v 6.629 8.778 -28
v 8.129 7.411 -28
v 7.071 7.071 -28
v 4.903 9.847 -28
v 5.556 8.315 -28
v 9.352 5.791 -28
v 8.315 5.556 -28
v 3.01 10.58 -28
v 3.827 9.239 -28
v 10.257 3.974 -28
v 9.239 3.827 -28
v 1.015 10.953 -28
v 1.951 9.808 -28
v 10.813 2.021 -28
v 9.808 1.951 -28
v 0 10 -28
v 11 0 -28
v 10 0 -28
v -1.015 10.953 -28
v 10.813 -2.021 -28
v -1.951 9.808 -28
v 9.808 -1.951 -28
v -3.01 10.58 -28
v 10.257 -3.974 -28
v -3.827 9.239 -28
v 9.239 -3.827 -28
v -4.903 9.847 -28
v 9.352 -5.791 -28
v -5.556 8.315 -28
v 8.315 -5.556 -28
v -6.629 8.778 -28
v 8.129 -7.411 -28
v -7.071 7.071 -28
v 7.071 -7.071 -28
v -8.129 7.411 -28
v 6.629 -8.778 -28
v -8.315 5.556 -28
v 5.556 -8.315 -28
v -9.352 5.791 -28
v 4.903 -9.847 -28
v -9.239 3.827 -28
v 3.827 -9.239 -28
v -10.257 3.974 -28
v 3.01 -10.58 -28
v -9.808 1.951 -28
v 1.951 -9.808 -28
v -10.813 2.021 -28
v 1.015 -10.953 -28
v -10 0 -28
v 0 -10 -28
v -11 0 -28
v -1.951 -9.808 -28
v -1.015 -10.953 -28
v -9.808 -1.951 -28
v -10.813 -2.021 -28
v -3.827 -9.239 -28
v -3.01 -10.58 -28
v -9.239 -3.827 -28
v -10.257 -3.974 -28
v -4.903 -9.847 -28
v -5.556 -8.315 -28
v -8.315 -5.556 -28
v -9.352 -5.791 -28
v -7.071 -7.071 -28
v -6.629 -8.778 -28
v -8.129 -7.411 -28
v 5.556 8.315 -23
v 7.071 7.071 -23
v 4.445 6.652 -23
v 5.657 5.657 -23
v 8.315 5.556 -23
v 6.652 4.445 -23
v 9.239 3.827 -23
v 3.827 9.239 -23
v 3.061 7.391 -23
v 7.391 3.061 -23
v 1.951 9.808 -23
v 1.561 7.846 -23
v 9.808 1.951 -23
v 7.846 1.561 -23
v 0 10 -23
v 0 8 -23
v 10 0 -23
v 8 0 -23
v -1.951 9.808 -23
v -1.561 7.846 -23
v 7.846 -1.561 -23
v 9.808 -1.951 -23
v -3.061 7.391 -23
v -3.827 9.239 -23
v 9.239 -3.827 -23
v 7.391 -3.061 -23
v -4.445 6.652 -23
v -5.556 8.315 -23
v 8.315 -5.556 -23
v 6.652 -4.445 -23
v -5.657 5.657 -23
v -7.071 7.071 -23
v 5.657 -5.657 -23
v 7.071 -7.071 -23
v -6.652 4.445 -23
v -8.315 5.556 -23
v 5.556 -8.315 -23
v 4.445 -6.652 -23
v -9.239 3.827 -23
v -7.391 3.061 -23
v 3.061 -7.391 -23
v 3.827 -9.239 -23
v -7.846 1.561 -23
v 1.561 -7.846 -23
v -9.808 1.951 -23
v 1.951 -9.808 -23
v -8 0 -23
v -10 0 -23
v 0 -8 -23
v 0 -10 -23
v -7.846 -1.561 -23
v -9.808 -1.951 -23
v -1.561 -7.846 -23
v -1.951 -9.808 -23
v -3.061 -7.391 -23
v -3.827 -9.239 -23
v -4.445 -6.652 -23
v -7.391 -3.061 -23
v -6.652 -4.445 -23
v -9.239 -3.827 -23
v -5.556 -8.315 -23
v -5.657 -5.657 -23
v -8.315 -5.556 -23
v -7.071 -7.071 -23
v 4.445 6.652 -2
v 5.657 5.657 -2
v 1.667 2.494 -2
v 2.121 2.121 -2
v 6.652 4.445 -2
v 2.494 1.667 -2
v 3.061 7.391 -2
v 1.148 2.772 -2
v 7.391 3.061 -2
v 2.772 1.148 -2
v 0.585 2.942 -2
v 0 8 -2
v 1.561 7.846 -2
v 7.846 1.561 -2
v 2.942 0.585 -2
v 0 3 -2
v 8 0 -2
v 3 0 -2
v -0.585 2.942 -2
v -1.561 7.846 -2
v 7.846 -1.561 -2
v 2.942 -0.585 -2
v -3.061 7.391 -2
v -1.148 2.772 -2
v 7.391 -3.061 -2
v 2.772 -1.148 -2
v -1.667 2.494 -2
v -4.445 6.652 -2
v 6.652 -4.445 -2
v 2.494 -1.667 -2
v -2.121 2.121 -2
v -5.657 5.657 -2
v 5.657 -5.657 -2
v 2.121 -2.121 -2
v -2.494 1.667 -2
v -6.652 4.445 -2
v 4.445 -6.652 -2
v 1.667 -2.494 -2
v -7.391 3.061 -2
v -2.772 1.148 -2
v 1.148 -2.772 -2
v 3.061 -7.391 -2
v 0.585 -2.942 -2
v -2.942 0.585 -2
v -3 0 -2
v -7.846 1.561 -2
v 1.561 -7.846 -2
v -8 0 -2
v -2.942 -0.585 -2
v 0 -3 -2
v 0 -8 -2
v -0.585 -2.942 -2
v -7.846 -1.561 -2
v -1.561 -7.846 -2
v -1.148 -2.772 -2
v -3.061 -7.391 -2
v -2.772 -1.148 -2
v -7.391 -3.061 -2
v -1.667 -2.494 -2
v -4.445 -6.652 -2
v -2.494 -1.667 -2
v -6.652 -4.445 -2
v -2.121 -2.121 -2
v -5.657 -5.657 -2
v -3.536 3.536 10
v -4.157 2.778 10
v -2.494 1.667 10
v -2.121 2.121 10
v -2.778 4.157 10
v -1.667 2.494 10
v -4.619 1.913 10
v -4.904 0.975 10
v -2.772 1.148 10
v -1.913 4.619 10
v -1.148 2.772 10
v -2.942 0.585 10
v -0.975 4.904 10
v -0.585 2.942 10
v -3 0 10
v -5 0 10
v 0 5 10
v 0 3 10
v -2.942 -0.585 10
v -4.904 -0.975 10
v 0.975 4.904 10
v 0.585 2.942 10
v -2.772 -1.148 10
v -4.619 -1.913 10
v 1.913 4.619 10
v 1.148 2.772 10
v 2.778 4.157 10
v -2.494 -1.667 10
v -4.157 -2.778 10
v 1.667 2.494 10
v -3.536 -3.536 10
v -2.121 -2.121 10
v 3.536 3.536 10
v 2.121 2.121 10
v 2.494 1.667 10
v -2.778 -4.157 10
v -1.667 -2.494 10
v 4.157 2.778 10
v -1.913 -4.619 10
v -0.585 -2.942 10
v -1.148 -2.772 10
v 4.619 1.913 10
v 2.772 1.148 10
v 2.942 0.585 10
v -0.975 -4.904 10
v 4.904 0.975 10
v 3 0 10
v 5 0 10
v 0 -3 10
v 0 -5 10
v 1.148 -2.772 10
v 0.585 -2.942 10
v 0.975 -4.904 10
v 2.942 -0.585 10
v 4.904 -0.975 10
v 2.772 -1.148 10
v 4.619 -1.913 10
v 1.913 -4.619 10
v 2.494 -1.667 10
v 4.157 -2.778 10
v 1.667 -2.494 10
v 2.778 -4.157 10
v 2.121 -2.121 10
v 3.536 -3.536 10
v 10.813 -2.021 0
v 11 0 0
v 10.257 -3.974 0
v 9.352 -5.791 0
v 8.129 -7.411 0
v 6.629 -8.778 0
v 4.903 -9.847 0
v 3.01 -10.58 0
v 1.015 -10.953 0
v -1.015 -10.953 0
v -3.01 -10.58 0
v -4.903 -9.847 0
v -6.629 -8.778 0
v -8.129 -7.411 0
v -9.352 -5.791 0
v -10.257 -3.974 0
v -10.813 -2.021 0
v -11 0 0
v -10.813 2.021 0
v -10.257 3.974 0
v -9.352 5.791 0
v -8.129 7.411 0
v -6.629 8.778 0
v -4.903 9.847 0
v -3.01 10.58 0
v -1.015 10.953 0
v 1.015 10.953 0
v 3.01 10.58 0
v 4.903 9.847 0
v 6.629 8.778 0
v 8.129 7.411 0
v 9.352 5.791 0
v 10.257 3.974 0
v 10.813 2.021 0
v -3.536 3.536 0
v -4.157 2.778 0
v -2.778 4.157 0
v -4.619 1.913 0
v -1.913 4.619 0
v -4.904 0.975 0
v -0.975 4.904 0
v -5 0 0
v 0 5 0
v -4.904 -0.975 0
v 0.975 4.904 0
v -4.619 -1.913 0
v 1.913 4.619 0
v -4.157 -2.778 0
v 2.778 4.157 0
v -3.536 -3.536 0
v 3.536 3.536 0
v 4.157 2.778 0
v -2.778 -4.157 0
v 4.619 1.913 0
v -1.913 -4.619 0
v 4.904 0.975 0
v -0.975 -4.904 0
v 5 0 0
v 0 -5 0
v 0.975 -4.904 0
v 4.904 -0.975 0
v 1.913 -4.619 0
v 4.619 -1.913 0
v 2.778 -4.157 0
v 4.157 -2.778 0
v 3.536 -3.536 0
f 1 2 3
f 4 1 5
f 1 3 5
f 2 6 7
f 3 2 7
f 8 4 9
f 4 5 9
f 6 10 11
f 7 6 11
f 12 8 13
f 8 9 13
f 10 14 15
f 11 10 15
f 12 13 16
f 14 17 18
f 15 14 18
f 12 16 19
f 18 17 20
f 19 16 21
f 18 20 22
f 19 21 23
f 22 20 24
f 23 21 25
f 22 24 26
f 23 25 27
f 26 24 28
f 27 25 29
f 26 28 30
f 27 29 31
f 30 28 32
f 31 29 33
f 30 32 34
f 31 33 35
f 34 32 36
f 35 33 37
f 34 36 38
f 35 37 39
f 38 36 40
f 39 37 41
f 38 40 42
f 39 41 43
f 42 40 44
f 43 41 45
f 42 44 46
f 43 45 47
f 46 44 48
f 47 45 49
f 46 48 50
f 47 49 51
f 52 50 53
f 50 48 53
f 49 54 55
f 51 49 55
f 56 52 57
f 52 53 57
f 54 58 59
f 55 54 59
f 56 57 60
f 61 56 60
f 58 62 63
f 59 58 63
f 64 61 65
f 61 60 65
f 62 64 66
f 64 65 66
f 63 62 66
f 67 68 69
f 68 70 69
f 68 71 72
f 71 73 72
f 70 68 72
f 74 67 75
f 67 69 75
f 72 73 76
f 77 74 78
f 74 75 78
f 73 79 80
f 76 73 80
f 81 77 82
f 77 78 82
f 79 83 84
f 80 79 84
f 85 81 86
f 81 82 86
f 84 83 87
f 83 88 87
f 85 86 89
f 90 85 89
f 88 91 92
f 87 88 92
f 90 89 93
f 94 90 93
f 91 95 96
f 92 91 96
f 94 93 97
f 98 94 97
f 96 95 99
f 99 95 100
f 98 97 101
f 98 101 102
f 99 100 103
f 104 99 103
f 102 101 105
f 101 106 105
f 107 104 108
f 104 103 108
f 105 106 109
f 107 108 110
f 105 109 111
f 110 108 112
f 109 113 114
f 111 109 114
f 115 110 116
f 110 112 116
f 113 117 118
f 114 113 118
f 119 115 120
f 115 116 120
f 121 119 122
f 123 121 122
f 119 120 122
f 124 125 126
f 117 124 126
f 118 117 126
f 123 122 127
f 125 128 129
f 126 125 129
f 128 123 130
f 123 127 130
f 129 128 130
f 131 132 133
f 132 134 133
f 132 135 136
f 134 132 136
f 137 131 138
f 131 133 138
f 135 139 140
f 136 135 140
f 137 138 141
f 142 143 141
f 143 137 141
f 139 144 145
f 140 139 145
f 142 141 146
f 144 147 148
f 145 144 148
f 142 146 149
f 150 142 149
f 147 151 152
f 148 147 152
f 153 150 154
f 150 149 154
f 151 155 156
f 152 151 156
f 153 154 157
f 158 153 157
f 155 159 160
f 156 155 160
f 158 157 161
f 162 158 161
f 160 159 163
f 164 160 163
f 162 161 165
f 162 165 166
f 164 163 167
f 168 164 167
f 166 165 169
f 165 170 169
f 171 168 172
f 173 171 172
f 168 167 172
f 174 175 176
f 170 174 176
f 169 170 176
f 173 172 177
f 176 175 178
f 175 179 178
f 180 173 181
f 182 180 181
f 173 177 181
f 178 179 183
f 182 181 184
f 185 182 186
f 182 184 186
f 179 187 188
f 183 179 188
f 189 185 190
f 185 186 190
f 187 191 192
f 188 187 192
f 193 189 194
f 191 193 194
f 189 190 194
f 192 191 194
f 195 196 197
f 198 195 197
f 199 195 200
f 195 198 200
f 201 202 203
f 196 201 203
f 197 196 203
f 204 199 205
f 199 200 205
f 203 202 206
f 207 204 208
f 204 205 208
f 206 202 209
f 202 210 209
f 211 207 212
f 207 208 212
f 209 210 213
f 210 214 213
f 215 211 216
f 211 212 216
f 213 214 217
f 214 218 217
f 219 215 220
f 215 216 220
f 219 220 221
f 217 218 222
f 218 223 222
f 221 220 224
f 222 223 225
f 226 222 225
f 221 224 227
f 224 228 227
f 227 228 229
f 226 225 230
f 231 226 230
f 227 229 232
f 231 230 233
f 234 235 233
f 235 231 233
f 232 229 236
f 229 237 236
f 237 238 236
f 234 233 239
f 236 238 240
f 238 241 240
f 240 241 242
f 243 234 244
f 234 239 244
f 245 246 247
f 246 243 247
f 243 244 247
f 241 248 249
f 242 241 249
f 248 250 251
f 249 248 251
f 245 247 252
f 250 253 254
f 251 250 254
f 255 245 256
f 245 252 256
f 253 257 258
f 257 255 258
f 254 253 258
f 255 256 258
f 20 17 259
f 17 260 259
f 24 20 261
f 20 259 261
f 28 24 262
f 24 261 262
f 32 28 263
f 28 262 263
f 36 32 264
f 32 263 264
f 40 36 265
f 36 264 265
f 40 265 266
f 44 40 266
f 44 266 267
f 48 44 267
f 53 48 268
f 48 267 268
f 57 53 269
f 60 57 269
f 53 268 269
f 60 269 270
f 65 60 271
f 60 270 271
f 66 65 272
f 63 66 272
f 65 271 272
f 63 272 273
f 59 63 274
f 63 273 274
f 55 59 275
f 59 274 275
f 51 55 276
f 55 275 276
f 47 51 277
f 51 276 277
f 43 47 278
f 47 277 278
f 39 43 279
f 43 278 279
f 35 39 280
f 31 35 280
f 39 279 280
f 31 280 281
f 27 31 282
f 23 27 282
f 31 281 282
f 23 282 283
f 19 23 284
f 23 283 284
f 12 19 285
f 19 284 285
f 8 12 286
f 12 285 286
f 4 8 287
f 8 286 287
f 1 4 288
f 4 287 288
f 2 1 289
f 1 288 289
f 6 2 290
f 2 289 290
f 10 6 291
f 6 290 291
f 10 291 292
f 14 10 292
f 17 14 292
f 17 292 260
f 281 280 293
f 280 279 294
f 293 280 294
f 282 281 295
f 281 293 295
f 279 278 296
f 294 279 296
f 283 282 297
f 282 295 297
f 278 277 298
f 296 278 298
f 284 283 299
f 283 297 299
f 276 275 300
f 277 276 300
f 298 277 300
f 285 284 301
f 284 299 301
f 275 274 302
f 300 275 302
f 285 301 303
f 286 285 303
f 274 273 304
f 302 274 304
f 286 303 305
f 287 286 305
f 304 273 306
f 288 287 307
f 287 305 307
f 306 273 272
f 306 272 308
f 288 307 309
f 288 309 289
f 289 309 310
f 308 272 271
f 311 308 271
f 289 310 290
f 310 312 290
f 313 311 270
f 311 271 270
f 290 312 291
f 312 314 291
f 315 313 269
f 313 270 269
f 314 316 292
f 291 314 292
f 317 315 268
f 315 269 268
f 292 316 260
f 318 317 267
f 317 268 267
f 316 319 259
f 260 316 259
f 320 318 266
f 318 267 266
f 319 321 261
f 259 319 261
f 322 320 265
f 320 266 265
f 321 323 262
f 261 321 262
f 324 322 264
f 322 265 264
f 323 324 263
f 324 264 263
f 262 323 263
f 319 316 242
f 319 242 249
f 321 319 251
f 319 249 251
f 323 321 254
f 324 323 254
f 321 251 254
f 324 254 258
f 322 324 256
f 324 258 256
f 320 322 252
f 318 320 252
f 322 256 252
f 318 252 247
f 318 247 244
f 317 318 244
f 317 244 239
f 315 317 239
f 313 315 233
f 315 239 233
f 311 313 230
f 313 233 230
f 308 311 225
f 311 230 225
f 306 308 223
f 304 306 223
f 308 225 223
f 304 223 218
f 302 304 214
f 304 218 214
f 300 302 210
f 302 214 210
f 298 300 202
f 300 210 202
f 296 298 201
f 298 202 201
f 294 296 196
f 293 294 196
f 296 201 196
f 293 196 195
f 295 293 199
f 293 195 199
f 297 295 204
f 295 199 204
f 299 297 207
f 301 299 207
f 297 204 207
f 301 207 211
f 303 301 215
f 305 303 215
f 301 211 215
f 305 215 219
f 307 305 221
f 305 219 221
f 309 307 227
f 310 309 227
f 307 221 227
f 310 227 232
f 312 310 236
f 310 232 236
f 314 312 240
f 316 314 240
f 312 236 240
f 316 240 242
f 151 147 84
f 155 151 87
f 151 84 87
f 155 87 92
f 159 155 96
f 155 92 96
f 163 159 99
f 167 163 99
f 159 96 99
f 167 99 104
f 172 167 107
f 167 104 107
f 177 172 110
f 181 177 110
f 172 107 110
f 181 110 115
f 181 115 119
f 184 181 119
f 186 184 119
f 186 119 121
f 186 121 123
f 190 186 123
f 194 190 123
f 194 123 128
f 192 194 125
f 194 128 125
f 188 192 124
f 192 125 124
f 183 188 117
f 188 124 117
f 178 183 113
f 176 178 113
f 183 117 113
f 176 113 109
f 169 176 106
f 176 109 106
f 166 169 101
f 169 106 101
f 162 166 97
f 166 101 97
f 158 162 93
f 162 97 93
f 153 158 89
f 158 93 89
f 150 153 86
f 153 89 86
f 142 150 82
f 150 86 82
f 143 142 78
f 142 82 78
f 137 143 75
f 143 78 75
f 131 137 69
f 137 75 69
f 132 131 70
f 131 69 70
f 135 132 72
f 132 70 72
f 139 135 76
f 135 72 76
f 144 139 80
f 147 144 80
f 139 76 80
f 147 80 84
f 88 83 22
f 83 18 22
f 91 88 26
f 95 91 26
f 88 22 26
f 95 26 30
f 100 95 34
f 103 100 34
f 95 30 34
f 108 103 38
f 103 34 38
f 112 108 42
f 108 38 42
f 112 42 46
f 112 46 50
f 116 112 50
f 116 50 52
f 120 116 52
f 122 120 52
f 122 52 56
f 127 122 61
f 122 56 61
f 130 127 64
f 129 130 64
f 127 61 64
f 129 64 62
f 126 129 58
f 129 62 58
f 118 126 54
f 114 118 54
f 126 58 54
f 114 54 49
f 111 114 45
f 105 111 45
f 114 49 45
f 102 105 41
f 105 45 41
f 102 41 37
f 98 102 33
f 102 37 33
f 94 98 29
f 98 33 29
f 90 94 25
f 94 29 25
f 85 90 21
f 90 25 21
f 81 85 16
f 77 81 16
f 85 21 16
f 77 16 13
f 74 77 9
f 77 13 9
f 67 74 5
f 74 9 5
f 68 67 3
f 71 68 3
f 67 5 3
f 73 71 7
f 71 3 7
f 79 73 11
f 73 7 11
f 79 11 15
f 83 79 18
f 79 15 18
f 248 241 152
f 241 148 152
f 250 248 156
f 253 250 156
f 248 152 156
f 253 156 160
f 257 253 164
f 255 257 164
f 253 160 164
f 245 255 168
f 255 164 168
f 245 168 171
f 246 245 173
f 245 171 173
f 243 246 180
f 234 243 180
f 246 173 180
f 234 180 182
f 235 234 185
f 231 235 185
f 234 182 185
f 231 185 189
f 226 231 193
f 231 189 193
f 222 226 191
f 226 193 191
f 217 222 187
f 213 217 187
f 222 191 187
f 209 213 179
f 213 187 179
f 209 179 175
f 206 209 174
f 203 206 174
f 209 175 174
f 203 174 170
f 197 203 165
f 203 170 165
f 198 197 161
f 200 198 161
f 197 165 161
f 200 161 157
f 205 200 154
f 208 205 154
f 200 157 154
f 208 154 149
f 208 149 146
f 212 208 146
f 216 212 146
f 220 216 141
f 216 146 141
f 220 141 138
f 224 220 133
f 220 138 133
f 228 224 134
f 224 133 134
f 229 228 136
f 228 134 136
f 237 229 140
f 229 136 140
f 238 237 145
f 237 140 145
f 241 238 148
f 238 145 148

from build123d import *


with BuildPart() as part:
    # Эскиз1 → Повернуть1 (revolve)
    with BuildSketch(Plane(origin=(0, 0, 0), x_dir=(0, 0, -1), z_dir=(1, 0, 0)), mode=Mode.PRIVATE) as revolve_1_sk:
        Polygon((28, 11), (0, 11), (0, 5), (-10, 5), (-10, 3), (2, 3), (2, 8), (23, 8), (23, 10), (28, 10), align=None)
    revolve(revolve_1_sk.sketch.rotate(Axis((0, 0, 28.642974124), (0, 0, -1)), 90), axis=Axis((0, 0, 28.642974124), (0, 0, -1)))


solid = part.part
